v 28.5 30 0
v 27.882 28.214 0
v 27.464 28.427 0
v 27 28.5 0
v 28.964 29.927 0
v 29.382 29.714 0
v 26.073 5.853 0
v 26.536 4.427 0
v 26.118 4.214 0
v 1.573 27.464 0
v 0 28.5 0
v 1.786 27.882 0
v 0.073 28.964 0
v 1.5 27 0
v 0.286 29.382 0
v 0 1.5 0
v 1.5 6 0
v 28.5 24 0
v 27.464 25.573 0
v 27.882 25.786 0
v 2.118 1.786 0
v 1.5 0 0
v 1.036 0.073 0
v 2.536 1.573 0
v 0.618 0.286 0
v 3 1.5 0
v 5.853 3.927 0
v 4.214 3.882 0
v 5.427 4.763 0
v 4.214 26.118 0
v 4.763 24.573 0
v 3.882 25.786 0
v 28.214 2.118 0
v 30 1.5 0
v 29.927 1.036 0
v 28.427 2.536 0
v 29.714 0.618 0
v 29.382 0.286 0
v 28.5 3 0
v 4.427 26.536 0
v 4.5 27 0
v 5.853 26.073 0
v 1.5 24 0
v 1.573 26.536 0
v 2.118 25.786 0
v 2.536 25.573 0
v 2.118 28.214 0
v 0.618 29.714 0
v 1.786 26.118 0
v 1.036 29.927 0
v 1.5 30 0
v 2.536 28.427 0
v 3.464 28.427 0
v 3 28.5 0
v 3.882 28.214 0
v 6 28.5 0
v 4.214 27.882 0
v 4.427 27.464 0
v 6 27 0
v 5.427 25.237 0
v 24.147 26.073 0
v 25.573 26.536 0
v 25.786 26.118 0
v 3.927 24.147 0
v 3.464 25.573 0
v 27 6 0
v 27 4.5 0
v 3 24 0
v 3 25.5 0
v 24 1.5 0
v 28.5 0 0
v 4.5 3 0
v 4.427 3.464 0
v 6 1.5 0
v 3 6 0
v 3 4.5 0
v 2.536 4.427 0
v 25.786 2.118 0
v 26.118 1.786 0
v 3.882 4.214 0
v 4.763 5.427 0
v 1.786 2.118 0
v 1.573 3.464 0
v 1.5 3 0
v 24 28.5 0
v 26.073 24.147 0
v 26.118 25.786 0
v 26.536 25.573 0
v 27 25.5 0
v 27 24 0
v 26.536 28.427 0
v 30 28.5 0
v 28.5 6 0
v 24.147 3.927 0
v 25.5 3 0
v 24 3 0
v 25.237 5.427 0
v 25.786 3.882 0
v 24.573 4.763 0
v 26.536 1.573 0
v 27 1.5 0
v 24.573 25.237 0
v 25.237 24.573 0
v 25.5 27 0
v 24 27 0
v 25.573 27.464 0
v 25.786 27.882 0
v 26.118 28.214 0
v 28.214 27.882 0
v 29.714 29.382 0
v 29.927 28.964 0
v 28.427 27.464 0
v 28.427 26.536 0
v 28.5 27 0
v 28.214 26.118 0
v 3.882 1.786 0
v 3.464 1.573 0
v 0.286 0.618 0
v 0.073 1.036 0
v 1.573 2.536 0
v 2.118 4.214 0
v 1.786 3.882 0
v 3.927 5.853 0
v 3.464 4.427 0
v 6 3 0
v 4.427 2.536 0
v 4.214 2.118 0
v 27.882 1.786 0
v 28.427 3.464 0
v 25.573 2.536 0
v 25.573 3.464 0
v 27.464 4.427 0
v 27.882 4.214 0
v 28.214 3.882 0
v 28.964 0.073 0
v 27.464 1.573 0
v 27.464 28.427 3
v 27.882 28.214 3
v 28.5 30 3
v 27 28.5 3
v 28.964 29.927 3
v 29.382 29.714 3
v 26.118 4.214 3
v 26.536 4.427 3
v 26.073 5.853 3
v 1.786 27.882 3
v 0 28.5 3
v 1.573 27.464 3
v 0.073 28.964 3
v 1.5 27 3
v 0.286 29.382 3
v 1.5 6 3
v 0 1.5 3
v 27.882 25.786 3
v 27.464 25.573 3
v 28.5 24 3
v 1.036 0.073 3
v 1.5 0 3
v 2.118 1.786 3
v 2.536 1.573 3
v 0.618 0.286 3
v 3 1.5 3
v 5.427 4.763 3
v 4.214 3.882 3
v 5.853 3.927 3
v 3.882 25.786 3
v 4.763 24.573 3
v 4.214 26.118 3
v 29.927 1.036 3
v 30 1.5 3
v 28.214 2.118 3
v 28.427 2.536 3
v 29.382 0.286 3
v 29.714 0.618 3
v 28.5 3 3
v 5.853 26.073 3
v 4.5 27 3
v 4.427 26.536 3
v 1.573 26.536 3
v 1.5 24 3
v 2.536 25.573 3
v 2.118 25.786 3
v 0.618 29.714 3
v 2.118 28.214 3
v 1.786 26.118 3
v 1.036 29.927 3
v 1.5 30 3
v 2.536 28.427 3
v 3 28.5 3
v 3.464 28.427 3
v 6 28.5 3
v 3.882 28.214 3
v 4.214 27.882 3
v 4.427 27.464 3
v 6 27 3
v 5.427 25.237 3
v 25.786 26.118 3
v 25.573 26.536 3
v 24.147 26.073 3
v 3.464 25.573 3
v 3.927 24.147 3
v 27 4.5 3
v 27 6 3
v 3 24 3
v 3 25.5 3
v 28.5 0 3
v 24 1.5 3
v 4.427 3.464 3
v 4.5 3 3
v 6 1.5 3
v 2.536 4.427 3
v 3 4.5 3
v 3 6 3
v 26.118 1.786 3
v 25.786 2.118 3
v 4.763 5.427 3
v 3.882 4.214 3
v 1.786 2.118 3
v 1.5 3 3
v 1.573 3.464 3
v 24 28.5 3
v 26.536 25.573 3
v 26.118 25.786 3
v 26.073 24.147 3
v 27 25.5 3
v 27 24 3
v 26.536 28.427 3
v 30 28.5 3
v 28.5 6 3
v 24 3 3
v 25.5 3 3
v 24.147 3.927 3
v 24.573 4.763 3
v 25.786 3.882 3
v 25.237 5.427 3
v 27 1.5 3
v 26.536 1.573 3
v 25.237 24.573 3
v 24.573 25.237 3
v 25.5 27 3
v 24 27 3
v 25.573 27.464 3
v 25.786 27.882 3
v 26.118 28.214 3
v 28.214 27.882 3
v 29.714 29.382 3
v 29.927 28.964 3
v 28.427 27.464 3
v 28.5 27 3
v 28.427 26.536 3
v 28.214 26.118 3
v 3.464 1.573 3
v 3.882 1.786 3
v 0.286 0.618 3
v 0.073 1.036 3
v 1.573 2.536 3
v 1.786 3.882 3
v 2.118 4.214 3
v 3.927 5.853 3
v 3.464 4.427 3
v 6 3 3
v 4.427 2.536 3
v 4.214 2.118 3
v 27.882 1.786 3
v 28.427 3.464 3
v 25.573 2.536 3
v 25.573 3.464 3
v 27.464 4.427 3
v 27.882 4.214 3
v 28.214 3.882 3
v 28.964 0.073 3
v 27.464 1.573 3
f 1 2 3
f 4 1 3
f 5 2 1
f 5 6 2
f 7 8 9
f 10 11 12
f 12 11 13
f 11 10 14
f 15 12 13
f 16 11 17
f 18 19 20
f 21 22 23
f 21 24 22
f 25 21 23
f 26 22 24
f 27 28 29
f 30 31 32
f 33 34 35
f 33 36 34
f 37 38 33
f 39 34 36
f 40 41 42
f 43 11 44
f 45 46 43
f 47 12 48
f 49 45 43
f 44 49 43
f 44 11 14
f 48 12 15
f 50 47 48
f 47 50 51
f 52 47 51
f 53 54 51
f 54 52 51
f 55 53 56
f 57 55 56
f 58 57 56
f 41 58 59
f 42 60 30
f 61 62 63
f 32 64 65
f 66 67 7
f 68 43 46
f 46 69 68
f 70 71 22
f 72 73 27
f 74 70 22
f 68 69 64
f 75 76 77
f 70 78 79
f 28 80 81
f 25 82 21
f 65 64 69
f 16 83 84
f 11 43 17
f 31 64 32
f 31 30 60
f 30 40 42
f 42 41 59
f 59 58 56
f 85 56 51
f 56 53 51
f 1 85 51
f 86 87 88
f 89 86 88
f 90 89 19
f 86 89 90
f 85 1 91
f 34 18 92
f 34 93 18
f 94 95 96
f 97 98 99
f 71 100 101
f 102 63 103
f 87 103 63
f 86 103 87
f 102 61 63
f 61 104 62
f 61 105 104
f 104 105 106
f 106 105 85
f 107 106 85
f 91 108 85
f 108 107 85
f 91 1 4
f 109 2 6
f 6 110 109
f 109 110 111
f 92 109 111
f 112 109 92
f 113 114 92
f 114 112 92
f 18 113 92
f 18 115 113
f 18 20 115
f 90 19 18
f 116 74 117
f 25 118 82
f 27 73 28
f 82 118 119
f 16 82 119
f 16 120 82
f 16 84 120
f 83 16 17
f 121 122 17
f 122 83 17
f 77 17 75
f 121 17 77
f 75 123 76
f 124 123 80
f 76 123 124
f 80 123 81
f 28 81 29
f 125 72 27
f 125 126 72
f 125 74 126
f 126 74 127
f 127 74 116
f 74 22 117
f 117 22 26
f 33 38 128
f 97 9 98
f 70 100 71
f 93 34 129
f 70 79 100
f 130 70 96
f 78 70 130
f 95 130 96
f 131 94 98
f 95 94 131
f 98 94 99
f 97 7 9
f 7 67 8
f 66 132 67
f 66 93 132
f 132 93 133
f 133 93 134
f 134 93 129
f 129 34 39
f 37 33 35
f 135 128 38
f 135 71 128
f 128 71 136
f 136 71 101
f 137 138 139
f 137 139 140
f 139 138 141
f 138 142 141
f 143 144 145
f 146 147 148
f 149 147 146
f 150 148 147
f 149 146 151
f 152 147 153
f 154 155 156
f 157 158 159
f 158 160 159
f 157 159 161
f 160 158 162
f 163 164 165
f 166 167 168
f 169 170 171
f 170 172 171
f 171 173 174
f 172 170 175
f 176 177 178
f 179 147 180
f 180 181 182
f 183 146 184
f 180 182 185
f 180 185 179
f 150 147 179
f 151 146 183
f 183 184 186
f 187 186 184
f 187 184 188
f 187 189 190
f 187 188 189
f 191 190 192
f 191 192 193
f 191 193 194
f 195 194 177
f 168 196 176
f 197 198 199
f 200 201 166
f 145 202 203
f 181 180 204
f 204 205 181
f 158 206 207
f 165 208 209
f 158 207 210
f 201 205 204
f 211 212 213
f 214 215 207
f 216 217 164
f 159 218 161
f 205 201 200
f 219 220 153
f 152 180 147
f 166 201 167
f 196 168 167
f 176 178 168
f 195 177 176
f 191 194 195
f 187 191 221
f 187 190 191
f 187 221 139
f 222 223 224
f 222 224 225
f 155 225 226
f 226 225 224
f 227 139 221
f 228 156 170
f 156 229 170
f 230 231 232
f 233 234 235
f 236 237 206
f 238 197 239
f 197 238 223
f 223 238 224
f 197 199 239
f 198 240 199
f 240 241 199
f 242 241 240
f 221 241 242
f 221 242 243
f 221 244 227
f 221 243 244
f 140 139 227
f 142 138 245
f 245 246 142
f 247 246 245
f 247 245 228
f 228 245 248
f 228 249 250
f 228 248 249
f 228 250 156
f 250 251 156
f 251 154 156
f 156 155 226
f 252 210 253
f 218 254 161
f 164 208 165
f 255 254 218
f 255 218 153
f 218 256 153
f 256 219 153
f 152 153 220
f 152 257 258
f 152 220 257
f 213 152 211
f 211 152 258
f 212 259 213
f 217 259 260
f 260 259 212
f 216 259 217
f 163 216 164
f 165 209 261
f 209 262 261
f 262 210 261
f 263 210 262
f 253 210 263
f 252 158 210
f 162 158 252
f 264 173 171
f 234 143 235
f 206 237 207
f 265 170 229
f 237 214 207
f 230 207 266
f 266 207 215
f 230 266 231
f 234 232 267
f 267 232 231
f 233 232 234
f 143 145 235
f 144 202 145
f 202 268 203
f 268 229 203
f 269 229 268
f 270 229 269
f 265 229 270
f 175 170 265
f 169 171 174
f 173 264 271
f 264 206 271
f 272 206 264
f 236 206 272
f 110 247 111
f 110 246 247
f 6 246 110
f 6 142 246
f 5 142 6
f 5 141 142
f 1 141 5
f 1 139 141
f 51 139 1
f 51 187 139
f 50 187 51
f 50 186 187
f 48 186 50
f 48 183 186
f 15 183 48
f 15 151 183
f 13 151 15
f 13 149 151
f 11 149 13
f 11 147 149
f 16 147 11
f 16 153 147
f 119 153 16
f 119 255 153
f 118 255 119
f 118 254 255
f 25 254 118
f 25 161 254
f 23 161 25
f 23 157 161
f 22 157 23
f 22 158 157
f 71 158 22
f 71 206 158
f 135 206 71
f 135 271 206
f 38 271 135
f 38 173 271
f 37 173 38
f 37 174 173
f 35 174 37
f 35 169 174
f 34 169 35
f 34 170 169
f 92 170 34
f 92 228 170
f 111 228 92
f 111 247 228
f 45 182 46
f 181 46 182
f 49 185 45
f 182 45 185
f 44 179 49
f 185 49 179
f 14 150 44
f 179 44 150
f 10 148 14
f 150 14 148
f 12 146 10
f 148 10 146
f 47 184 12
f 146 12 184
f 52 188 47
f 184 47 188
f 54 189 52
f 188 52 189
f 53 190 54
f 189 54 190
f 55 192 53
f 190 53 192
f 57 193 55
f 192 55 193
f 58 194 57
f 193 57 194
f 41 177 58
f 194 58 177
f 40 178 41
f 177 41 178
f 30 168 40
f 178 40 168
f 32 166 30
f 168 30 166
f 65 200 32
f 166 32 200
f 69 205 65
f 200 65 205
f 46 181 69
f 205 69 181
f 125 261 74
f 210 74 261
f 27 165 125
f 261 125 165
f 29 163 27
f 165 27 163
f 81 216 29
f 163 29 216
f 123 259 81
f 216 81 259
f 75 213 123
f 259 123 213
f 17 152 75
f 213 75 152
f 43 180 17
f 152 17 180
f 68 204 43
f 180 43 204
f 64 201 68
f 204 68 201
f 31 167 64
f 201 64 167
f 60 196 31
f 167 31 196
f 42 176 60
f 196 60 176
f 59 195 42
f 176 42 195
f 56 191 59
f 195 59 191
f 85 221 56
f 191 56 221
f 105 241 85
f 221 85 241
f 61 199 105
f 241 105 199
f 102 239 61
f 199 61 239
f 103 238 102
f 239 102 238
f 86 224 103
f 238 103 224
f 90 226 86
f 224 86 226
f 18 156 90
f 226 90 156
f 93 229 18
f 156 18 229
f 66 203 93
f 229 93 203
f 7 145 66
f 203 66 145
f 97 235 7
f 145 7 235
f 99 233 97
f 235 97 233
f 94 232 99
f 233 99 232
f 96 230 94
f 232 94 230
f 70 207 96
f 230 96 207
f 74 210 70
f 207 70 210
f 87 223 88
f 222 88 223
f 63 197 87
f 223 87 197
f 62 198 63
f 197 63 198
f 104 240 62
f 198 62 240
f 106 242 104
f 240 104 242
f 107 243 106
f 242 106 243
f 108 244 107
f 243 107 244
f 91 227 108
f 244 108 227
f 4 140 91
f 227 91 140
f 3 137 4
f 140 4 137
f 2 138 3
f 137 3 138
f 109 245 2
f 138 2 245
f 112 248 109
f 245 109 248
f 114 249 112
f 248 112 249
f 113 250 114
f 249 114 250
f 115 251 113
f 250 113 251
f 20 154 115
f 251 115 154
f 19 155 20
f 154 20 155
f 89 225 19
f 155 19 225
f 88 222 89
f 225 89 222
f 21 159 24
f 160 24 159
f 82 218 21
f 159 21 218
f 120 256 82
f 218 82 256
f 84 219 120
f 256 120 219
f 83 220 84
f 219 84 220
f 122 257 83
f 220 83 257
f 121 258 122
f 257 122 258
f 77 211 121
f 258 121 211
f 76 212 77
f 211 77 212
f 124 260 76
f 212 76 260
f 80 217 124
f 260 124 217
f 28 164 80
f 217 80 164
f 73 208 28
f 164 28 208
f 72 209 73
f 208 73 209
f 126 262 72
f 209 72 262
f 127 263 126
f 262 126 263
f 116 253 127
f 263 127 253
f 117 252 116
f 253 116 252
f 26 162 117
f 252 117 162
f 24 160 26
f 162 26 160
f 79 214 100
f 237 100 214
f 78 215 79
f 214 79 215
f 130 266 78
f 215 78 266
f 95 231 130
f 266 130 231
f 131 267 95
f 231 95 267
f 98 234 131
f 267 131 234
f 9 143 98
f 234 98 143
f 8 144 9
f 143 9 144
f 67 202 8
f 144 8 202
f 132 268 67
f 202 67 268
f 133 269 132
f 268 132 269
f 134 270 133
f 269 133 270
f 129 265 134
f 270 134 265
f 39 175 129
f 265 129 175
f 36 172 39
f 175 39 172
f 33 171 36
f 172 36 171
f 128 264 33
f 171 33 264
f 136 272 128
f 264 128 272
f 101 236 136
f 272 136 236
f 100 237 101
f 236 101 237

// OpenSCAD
/*
OPENSCAD Library file by the DoomMeister
Mounting surround for small DC fans (25 - 120mm)

Data taken from various places around the internet.
http://www.qwikflow.com/dc_fans.html

//Released under the terms of the GNU GPL v3.0
This program is free software: you can redistribute it and/or modify
it under the terms of the GNU General Public License as published by
the Free Software Foundation, either version 3 of the License, or
(at your option) any later version.

This program is distributed in the hope that it will be useful,
but WITHOUT ANY WARRANTY; without even the implied warranty of
MERCHANTABILITY or FITNESS FOR A PARTICULAR PURPOSE. See the
GNU General Public License for more details.

You should have received a copy of the GNU General Public License
along with this program. If not, see <http://www.gnu.org/licenses/>.
*/

//uncomment this for example
fan_mount(size=30,thick=3);

module fan_mount(size=40,thick = 4)
{
if(size == 25)
	{
	_fan_mount(
			fan_size = 25,
			fan_mounting_pitch = 20,
			fan_m_hole_dia = 3,
			holder_thickness = thick
		 );
	}
if(size == 30)
	{
	_fan_mount(
			fan_size = 30,
			fan_mounting_pitch = 24,
			fan_m_hole_dia = 3,
			holder_thickness = thick
		 );
	}

if(size == 40)
	{
	_fan_mount(
			fan_size = 40,
			fan_mounting_pitch = 32,
			fan_m_hole_dia = 3.5,
			holder_thickness = thick
		 );
	}
if(size == 45)
	{
	_fan_mount(
			fan_size = 45,
			fan_mounting_pitch = 37,
			fan_m_hole_dia = 4.3,
			holder_thickness = thick
		 );
	}
if(size == 60)
	{
	_fan_mount(
			fan_size = 60,
			fan_mounting_pitch = 50,
			fan_m_hole_dia = 4.4,
			holder_thickness = thick
		 );
	}
if(size == 80)
	{
	_fan_mount(
			fan_size = 80,
			fan_mounting_pitch = 71.5,
			fan_m_hole_dia = 4.4,
			holder_thickness = thick
		 );
	}

if(size == 120)
	{
	_fan_mount(
			fan_size = 120,
			fan_mounting_pitch = 105,
			fan_m_hole_dia = 4.4,
			holder_thickness = thick
		 );
	}
}


//inner module
module _fan_mount(
			fan_size, //nominsl size of fan
			fan_mounting_pitch, //pitch between mounting holes
			fan_m_hole_dia, //mounting hole diameter
			holder_thickness //user defined thickness
		 )
{

offset1 = (fan_size-(fan_mounting_pitch + fan_m_hole_dia))/2;
offset2 = (fan_size-(fan_mounting_pitch))/2;
offset3 = offset2 + fan_mounting_pitch;
thickness = (fan_size-fan_mounting_pitch)/2;	
			
			//difference()
			//{
			linear_extrude(height = holder_thickness)
			union()
			{	
			difference()
			{
				translate([fan_m_hole_dia/2,fan_m_hole_dia/2,0])
				minkowski()
				{	
					square([fan_size - fan_m_hole_dia,fan_size - fan_m_hole_dia]);
					circle(r= fan_m_hole_dia/2, $fn=20);
				}
			
					translate([offset1,offset1,0])
					square([fan_mounting_pitch + fan_m_hole_dia,fan_mounting_pitch + fan_m_hole_dia]);
				}
				translate([offset2,offset2,0])
				rotate([0,0,0])_corner_hole();
				translate([offset3,offset2,0])
				rotate([0,0,90])_corner_hole();
				translate([offset2,offset3,0])
				rotate([0,0,90])_corner_hole();
				translate([offset3,offset3,0])
				rotate([0,0,0])_corner_hole();
			}

module _corner_hole()
{
				difference(){
					union(){
							difference(){
							square([fan_m_hole_dia + thickness,fan_m_hole_dia + thickness],center=true);
							square([(fan_m_hole_dia + thickness)/2,(fan_m_hole_dia + thickness)/2],center=false);
							translate([-(fan_m_hole_dia + thickness)/2,-(fan_m_hole_dia + thickness)/2])
							square([(fan_m_hole_dia + thickness)/2,(fan_m_hole_dia + thickness)/2],center=false);
							}
					circle(r=(fan_m_hole_dia + thickness)/2, $fn=20);
					}
					circle(r=(fan_m_hole_dia)/2, $fn=20);
				}
}


echo(offset1,offset2,thickness);
}
